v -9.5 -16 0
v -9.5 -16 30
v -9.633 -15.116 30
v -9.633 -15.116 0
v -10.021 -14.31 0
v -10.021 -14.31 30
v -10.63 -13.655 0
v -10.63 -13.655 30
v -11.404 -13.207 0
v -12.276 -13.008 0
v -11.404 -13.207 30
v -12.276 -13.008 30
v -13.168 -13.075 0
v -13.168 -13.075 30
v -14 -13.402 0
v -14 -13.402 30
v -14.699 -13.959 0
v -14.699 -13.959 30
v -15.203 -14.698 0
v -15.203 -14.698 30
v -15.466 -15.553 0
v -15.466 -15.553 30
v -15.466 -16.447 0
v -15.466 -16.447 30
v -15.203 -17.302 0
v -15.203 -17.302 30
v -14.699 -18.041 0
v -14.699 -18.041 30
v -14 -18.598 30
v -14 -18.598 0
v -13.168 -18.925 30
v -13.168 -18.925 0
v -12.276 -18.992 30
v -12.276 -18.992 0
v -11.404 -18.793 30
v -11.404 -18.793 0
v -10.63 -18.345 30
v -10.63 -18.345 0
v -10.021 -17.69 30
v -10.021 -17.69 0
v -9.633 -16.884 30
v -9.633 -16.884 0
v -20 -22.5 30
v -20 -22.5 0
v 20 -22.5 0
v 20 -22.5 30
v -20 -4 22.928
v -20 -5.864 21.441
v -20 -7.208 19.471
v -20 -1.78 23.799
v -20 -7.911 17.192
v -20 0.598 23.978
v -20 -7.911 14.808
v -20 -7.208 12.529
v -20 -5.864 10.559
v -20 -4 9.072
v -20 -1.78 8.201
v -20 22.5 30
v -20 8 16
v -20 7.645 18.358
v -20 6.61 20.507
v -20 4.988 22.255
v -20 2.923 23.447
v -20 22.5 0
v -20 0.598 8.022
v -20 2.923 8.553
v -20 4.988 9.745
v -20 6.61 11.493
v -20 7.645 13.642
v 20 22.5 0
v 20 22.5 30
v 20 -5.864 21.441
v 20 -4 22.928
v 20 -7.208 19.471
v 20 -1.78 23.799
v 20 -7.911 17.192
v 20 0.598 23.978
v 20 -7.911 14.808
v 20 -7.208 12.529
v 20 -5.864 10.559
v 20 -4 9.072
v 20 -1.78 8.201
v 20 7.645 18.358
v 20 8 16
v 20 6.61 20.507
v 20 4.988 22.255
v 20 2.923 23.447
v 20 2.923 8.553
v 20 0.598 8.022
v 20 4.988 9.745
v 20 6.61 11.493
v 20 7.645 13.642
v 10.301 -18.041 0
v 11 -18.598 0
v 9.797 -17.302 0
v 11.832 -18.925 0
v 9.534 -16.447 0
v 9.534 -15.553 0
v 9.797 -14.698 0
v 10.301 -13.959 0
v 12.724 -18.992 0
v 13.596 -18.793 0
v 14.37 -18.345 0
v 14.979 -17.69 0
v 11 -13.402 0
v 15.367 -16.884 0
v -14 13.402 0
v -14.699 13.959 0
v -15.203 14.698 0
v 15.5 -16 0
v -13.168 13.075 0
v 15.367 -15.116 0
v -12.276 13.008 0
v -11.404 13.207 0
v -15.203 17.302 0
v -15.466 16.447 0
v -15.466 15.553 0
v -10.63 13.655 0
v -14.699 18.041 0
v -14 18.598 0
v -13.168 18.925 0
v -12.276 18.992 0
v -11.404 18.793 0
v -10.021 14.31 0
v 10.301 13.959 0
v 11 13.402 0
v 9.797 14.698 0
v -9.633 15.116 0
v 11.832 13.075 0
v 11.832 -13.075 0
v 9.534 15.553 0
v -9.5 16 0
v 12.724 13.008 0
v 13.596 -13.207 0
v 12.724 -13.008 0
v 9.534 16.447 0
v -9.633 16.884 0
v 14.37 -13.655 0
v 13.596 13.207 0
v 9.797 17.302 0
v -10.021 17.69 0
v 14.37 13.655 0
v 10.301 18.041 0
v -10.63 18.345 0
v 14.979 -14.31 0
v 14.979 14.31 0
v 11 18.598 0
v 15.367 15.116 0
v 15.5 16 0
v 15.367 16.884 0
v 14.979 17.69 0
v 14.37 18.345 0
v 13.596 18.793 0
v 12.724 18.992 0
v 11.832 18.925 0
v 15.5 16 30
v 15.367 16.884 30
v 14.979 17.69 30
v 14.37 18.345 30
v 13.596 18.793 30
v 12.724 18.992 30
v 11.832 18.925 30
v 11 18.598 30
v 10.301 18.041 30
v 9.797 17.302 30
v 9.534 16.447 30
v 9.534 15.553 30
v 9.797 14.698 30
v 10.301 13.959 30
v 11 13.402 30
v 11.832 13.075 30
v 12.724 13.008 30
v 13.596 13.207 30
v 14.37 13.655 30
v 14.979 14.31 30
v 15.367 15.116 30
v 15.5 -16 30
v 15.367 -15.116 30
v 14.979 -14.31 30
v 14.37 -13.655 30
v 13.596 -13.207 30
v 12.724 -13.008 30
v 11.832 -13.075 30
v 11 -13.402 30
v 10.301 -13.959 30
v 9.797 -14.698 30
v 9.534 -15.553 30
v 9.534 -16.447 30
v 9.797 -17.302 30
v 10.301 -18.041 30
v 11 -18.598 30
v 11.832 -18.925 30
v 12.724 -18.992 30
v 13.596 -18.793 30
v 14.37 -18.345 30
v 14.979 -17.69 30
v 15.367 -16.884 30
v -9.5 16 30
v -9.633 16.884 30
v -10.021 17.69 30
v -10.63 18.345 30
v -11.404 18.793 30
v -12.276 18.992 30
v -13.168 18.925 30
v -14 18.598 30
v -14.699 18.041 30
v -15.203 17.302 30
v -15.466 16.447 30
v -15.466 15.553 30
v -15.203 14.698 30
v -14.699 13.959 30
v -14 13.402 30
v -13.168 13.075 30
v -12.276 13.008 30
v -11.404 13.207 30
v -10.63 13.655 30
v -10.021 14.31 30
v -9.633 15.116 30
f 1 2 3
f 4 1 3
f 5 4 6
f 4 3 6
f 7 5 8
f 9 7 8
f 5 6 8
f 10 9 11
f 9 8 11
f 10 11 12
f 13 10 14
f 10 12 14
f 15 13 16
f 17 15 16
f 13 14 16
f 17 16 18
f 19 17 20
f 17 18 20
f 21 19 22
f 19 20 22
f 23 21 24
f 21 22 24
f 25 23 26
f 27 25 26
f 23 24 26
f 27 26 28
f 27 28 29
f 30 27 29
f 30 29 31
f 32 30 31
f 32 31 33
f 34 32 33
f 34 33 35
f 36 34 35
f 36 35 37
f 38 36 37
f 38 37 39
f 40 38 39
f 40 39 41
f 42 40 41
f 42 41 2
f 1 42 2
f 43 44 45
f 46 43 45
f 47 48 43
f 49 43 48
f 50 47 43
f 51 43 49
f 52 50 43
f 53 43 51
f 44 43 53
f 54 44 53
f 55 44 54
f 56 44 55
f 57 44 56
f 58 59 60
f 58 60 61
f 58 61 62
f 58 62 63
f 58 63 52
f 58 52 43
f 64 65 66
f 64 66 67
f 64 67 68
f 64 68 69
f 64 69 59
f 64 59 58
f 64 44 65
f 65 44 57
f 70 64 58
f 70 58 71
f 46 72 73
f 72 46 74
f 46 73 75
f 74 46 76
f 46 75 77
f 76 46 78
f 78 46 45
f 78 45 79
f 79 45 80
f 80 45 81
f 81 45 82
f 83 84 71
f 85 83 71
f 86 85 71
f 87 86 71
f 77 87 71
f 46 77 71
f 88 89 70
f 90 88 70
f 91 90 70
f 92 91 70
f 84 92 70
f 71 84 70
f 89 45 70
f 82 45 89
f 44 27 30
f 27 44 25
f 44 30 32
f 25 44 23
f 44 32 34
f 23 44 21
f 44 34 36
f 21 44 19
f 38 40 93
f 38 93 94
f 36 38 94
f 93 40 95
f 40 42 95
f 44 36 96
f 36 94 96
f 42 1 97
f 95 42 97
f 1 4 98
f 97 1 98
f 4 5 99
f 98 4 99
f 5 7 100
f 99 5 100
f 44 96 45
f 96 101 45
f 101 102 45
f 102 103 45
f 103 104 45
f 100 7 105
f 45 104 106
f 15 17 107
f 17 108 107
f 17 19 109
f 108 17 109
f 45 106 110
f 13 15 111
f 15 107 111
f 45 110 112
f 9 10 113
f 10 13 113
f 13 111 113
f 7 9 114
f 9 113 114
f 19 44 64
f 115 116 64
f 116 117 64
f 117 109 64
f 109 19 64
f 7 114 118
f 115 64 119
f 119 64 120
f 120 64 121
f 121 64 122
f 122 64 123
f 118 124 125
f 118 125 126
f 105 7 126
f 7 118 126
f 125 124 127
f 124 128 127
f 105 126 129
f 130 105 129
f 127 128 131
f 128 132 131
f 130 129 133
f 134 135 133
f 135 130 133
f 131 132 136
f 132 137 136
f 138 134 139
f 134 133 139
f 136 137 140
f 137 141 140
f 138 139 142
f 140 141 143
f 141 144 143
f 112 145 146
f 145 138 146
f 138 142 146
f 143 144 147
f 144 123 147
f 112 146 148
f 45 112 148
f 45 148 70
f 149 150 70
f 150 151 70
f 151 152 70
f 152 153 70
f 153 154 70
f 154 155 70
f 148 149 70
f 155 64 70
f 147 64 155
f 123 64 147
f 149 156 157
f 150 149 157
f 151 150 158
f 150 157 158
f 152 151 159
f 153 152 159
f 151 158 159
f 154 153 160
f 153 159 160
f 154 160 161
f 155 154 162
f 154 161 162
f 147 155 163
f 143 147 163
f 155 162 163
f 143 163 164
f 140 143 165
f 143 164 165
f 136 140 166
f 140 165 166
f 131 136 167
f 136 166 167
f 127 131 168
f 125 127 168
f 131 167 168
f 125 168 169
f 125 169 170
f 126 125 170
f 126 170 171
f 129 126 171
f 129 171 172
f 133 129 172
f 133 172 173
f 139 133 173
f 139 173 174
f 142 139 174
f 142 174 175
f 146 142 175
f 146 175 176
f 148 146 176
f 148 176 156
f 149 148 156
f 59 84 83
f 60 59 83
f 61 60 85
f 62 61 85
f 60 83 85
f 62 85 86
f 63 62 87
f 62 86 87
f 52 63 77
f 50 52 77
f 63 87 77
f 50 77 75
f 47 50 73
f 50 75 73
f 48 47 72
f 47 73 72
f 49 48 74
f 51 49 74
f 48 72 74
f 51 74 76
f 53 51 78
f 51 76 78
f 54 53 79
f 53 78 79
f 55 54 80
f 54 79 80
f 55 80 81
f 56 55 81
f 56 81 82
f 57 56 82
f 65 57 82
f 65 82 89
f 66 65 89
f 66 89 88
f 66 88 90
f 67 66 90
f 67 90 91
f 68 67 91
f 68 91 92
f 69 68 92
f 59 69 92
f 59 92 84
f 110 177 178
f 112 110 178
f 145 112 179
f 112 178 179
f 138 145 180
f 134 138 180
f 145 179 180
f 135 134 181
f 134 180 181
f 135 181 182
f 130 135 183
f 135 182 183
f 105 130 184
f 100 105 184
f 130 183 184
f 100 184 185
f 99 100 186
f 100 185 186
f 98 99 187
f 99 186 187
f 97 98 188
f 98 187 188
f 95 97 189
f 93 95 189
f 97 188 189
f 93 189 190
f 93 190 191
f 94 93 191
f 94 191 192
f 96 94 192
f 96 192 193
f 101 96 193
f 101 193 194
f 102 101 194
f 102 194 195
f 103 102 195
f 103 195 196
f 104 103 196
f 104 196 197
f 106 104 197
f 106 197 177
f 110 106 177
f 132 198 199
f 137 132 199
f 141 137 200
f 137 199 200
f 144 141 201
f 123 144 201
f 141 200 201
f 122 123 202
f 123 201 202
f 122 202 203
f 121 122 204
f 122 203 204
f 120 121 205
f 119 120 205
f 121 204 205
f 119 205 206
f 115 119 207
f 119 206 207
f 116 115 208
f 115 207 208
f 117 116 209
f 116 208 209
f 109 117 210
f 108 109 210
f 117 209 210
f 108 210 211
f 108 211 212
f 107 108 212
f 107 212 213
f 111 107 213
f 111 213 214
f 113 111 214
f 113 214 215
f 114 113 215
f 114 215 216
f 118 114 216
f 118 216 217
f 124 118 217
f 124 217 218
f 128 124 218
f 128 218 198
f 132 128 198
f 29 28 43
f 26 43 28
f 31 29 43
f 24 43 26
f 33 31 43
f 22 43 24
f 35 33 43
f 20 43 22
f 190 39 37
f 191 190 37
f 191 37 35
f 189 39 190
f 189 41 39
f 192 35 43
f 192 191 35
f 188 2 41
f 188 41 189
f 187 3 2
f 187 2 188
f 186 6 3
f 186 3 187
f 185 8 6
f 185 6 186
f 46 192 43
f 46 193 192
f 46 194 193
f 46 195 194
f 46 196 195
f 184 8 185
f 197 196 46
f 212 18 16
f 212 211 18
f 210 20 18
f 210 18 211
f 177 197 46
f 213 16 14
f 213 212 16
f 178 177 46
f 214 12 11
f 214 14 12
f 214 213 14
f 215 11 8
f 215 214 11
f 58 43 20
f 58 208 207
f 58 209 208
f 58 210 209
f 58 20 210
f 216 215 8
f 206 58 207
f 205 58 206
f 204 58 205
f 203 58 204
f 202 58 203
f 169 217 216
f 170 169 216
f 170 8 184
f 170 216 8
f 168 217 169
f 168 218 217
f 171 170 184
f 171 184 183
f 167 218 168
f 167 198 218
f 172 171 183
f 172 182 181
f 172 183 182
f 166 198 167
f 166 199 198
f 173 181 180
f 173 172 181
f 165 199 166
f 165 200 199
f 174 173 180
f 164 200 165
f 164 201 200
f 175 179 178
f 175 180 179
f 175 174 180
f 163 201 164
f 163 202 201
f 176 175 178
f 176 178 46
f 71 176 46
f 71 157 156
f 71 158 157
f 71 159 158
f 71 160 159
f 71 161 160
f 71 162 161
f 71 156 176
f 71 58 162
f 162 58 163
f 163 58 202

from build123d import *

# Parameters (mm, degrees)
SKETCH1_W           = 40
SKETCH1_H           = 45
BOSS_EXTRUDE1_DEPTH = 30
SKETCH2_R           = 8
CUT_EXTRUDE1_DEPTH  = 55.829280499
SKETCH3_R           = 3
CUT_EXTRUDE2_DEPTH  = 43.5


with BuildPart() as part:
    # Sketch1 → Boss-Extrude1 (new body)
    with BuildSketch(Plane.XY):
        Rectangle(SKETCH1_W, SKETCH1_H)
    extrude(amount=BOSS_EXTRUDE1_DEPTH)

    # Sketch2 → Cut-Extrude1 (cut, through all)
    with BuildSketch(Plane(origin=(20, 0, 0), x_dir=(0, 0, -1), z_dir=(1, 0, 0))):
        with Locations(Location((-16, 0, 0), (0, 0, 90))):
            Circle(SKETCH2_R)
    extrude(amount=-CUT_EXTRUDE1_DEPTH, mode=Mode.SUBTRACT)

    # Sketch3 → Cut-Extrude2 (cut, through all)
    with BuildSketch(Plane.XY.offset(30)):
        with Locations((-12.5, 16)):
            Circle(SKETCH3_R)
        with Locations((12.5, 16)):
            Circle(SKETCH3_R)
        with Locations((12.5, -16)):
            Circle(SKETCH3_R)
        with Locations((-12.5, -16)):
            Circle(SKETCH3_R)
    extrude(amount=-CUT_EXTRUDE2_DEPTH, mode=Mode.SUBTRACT)


solid = part.part
